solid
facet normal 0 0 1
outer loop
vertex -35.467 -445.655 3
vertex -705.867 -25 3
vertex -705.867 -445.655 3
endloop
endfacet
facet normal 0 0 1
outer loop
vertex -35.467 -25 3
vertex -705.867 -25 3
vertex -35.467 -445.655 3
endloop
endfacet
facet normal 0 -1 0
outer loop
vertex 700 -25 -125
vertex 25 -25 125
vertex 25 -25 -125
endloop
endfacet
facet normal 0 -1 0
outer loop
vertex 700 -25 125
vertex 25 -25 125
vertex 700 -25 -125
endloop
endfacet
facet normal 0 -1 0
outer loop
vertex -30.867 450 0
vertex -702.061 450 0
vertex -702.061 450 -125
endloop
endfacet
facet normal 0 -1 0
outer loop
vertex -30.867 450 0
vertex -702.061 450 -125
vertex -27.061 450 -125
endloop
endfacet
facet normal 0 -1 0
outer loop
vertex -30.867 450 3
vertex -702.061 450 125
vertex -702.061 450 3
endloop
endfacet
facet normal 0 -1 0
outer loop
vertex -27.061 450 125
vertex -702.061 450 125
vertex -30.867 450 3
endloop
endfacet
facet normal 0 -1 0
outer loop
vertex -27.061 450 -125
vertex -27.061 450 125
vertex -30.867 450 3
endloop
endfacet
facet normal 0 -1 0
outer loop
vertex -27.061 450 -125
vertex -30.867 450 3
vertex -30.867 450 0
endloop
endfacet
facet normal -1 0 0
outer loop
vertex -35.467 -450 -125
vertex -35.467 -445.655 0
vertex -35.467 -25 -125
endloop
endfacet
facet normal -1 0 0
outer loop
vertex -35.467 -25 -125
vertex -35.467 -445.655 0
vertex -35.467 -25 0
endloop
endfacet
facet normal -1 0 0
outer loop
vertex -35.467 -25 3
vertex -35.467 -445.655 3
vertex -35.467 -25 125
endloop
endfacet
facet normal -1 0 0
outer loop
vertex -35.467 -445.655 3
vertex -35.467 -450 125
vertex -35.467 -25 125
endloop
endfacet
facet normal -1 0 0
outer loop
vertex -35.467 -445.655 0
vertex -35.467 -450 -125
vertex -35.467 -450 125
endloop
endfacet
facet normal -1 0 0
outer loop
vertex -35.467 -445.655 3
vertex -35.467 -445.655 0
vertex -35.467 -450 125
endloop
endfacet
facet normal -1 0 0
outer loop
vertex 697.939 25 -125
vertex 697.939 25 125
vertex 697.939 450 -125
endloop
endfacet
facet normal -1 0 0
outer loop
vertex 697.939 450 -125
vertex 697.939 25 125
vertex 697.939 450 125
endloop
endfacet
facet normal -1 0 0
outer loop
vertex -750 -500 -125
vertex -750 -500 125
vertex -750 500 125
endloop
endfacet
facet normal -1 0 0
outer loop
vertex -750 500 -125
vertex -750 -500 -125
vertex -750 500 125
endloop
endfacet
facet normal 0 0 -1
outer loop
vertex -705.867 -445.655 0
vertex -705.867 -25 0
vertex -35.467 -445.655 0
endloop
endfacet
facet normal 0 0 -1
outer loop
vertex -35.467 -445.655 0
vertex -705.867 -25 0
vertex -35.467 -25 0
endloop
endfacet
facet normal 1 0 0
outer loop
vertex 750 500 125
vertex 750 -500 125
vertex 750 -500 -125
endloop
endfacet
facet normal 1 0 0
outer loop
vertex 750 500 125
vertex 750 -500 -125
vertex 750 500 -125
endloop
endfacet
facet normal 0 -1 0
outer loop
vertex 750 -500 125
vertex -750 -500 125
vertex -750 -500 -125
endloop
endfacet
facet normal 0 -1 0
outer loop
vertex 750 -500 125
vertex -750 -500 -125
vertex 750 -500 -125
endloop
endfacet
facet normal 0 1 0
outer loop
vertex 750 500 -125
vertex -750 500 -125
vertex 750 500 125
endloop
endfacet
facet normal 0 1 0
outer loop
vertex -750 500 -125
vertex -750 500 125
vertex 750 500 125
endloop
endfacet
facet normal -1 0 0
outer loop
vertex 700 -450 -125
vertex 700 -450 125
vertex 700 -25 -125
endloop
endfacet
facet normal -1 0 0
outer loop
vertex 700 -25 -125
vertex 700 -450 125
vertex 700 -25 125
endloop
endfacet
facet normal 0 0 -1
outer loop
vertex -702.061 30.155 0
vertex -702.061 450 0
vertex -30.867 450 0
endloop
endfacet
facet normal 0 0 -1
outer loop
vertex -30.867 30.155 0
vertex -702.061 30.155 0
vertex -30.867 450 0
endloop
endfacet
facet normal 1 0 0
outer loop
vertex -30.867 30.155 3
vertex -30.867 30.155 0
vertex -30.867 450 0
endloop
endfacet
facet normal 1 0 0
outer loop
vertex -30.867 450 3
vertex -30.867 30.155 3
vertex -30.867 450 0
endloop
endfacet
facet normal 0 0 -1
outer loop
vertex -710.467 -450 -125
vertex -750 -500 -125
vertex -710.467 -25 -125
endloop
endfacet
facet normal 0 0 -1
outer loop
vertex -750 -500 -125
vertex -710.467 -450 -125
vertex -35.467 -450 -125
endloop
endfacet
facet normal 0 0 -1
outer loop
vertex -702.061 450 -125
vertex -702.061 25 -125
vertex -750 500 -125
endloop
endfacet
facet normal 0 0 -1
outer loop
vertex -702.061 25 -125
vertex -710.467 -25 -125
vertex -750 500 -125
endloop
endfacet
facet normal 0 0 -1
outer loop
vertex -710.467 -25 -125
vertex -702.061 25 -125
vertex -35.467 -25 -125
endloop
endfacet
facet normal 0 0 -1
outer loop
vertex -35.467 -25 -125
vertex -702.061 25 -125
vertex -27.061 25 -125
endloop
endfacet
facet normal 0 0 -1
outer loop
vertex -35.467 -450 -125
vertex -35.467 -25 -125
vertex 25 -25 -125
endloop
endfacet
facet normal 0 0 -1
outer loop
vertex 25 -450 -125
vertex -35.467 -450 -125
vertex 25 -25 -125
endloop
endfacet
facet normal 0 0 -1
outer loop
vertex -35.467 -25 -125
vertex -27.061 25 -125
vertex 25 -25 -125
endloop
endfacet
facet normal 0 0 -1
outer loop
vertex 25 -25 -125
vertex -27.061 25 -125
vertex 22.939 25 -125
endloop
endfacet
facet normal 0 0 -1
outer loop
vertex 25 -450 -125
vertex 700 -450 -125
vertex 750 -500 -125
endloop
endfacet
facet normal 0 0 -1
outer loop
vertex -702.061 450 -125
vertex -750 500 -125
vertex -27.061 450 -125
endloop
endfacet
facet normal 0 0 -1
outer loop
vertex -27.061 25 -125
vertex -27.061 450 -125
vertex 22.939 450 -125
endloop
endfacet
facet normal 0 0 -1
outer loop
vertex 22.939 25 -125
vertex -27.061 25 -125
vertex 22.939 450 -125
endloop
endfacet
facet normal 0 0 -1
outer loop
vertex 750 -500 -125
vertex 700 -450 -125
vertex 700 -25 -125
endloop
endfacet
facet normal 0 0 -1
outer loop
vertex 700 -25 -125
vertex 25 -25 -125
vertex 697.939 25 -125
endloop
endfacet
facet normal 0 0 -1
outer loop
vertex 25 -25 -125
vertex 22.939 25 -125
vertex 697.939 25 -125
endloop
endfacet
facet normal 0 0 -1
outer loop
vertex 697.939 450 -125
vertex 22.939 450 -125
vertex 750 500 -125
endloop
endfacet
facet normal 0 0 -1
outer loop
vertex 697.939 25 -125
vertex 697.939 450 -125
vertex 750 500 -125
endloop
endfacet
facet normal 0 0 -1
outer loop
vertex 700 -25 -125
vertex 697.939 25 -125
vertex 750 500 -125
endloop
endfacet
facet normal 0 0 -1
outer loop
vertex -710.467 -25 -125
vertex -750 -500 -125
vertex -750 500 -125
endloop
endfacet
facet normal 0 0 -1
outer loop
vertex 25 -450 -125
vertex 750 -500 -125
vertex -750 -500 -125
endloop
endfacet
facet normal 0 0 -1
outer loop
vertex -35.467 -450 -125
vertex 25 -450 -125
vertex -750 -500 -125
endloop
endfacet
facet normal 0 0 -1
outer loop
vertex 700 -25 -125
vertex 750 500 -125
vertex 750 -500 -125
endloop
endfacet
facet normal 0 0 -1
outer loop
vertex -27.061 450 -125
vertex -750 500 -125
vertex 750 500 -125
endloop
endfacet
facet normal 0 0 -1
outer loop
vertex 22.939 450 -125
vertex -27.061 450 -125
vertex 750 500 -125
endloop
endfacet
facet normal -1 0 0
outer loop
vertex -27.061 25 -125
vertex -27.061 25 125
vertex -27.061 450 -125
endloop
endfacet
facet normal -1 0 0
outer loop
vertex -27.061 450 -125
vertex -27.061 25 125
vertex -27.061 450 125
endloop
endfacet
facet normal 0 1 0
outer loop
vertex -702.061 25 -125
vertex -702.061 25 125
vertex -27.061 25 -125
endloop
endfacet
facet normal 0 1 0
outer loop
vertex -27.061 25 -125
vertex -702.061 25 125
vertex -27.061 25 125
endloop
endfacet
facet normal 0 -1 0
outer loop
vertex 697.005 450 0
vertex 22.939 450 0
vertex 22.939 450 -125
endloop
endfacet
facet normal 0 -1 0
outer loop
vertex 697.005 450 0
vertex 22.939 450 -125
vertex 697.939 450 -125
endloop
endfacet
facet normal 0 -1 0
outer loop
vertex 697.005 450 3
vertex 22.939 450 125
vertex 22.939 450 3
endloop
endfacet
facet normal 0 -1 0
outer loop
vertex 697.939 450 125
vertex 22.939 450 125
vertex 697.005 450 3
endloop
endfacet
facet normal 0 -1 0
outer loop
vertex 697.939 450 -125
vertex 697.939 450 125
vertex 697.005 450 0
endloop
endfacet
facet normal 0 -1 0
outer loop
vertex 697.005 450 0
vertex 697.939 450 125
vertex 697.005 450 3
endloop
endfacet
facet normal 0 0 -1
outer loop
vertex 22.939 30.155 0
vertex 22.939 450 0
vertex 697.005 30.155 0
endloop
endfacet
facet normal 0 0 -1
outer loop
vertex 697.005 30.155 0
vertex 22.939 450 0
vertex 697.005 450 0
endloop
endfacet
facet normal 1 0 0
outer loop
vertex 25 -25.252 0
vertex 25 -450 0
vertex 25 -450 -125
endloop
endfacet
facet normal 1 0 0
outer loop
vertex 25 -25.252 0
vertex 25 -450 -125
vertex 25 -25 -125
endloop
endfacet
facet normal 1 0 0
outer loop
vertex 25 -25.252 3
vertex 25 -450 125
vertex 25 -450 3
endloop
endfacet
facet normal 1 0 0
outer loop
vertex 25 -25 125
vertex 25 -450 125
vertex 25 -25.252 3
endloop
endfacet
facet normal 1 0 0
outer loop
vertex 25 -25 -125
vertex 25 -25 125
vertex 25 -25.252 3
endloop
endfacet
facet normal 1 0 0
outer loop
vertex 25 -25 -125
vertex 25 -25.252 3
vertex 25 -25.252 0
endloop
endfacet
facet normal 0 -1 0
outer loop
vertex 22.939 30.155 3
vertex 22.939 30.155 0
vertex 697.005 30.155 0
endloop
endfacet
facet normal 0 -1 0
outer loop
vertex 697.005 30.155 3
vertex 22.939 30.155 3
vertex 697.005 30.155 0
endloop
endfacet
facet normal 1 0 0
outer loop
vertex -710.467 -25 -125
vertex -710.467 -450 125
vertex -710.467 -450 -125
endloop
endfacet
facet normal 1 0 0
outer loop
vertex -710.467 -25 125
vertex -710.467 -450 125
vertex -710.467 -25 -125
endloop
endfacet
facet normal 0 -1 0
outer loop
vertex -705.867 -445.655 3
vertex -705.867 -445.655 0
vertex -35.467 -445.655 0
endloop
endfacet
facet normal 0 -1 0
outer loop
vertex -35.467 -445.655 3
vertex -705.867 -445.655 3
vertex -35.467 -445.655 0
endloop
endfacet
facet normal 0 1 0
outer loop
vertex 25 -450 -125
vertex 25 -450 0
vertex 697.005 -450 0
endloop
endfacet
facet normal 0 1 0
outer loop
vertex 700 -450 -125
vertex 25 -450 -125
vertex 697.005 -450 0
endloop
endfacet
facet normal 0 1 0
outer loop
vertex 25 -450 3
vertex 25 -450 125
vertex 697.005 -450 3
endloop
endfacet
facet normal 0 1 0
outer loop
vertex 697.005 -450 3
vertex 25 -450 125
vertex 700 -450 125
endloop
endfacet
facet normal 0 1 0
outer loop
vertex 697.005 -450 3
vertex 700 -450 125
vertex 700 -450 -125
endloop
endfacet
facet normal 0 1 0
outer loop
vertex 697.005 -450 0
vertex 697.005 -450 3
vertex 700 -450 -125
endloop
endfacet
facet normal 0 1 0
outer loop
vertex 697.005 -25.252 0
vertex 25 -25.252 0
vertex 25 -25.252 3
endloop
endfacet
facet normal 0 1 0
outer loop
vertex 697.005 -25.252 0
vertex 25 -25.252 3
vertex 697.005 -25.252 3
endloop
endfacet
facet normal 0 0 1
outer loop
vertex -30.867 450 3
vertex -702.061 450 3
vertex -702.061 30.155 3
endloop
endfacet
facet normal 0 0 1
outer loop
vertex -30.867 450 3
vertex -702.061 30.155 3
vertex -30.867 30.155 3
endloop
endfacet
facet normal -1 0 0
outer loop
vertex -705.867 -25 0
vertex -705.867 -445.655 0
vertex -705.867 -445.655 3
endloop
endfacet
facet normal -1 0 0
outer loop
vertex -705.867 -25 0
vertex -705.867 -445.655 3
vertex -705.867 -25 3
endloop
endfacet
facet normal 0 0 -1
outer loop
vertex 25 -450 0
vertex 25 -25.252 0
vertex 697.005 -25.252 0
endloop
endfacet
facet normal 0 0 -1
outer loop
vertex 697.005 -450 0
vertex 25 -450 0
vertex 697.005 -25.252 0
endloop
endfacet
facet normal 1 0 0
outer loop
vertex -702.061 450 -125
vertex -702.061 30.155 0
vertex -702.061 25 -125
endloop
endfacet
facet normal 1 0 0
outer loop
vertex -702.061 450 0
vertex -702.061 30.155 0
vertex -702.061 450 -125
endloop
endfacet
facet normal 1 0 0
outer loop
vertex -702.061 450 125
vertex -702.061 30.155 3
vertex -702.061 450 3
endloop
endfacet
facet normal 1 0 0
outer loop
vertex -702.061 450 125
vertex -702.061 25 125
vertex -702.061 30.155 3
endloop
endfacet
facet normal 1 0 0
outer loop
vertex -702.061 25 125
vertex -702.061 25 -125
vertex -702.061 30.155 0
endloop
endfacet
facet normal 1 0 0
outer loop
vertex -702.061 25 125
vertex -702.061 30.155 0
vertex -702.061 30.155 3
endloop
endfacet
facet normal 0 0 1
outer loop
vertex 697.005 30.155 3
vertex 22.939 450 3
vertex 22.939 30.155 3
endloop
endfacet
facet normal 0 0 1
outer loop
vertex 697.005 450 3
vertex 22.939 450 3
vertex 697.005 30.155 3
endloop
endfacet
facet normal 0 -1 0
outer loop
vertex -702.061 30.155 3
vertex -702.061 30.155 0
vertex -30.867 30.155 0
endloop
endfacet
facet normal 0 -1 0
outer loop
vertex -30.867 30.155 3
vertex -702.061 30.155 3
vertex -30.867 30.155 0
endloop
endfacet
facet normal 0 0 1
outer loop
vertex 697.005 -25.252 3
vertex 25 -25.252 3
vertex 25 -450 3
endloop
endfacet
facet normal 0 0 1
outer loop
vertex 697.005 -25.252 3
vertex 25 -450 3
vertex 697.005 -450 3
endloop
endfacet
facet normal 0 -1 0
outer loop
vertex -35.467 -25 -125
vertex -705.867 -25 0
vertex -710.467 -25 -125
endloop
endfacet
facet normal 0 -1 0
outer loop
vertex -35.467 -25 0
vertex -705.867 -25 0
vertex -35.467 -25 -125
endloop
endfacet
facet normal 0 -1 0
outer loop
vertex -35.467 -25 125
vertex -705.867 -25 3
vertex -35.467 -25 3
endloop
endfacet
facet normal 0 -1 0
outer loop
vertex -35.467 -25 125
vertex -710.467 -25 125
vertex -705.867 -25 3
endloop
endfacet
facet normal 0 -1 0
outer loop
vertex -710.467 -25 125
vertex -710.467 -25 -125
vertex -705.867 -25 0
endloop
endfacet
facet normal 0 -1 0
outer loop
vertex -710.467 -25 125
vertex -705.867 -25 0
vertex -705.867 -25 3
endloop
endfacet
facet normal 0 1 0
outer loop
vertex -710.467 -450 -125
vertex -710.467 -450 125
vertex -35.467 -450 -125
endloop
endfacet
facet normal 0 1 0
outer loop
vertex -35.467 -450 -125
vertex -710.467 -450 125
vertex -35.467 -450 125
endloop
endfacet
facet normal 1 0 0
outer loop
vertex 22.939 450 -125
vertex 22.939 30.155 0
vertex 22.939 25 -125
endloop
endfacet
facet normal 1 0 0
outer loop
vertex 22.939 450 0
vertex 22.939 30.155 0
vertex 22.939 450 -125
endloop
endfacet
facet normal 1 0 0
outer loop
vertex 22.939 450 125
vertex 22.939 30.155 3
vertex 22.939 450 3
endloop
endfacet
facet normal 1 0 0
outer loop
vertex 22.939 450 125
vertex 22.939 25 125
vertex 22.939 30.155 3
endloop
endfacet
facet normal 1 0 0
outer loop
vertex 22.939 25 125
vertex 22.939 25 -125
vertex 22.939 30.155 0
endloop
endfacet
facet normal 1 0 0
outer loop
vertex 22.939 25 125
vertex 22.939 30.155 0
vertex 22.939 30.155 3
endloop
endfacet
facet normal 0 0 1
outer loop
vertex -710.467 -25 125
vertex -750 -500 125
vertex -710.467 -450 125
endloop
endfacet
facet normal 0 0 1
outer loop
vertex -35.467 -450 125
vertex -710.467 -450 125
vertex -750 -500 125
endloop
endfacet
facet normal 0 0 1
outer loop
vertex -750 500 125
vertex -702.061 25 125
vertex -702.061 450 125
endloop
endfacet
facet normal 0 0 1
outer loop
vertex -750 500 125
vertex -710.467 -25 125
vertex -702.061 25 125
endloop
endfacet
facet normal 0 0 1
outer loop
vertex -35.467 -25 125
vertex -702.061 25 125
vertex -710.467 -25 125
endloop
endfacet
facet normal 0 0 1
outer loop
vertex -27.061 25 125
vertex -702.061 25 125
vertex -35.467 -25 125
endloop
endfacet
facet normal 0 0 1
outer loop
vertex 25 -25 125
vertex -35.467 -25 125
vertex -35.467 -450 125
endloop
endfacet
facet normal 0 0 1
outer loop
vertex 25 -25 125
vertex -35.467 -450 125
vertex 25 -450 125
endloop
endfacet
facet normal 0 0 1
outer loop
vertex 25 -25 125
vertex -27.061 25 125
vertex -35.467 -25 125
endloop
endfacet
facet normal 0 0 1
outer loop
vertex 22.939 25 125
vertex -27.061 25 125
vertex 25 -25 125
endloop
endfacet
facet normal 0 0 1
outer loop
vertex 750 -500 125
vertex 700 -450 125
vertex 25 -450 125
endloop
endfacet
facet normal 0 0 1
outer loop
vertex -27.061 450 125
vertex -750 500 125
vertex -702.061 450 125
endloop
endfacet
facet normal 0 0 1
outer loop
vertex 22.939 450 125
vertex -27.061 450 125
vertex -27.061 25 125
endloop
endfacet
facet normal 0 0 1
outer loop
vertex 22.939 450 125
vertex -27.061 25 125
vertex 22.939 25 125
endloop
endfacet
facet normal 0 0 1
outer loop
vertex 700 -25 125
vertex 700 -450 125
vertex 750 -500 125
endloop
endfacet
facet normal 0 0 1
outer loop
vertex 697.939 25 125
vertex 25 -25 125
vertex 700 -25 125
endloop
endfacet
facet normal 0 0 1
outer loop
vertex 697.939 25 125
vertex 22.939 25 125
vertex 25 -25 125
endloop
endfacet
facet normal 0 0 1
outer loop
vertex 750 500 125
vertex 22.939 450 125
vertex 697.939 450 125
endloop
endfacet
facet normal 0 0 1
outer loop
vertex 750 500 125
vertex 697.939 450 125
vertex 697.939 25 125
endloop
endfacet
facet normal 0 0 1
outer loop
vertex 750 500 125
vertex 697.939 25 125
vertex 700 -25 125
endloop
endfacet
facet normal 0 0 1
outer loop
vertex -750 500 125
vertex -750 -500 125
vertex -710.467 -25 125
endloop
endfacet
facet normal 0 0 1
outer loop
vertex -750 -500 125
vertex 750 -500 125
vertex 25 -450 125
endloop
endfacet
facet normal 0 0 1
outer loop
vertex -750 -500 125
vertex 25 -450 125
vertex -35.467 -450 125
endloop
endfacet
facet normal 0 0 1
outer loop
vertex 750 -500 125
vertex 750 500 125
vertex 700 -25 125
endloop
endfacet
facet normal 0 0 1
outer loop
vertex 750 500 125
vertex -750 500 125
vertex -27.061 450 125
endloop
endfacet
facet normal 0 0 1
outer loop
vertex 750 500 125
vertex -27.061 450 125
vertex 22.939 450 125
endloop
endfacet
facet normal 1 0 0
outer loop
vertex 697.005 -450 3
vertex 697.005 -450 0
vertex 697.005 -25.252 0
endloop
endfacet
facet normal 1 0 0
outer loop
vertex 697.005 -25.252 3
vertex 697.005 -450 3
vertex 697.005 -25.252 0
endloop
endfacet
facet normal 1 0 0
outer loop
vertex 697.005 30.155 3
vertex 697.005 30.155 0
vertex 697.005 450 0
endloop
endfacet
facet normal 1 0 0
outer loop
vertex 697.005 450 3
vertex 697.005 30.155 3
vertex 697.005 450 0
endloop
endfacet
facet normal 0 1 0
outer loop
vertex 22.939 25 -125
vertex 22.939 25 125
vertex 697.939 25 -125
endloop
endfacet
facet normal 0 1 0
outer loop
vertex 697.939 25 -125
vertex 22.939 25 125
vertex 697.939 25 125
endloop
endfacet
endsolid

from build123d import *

# Parameters (mm, degrees)
F0_W     = 1500
F0_H     = 1000
F0_W_2   = 675
F0_H_2   = 425
F1_DEPTH = 125
F2_W     = 675
F2_H     = 425
F3_DEPTH = 3


with BuildPart() as f1:
    # F0 (on Top) → F1 (new body, symmetric)
    with BuildSketch(Plane.XY):
        Rectangle(F0_W, F0_H)
        with Locations((-372.967375, -237.5)):
            Rectangle(F0_W_2, F0_H_2, mode=Mode.SUBTRACT)
        with Locations((362.5, -237.5)):
            Rectangle(F0_W_2, F0_H_2, mode=Mode.SUBTRACT)
        with Locations((-364.561057, 237.5)):
            Rectangle(F0_W_2, F0_H_2, mode=Mode.SUBTRACT)
        with Locations((360.438943, 237.5)):
            Rectangle(F0_W_2, F0_H_2, mode=Mode.SUBTRACT)
    extrude(amount=F1_DEPTH, both=True)

    # F2 (on Top) → F3 (join)
    with BuildSketch(Plane.XY):
        with Locations((-368.367167, 242.65543)):
            Rectangle(F2_W, F2_H)
        with Locations((-368.367167, -233.154571)):
            Rectangle(F2_W, F2_H)
        with Locations((359.504882, 242.65543)):
            Rectangle(F2_W, F2_H)
        with Locations((359.504882, -237.751758)):
            Rectangle(F2_W, F2_H)
    extrude(amount=F3_DEPTH)


solid = f1.part
